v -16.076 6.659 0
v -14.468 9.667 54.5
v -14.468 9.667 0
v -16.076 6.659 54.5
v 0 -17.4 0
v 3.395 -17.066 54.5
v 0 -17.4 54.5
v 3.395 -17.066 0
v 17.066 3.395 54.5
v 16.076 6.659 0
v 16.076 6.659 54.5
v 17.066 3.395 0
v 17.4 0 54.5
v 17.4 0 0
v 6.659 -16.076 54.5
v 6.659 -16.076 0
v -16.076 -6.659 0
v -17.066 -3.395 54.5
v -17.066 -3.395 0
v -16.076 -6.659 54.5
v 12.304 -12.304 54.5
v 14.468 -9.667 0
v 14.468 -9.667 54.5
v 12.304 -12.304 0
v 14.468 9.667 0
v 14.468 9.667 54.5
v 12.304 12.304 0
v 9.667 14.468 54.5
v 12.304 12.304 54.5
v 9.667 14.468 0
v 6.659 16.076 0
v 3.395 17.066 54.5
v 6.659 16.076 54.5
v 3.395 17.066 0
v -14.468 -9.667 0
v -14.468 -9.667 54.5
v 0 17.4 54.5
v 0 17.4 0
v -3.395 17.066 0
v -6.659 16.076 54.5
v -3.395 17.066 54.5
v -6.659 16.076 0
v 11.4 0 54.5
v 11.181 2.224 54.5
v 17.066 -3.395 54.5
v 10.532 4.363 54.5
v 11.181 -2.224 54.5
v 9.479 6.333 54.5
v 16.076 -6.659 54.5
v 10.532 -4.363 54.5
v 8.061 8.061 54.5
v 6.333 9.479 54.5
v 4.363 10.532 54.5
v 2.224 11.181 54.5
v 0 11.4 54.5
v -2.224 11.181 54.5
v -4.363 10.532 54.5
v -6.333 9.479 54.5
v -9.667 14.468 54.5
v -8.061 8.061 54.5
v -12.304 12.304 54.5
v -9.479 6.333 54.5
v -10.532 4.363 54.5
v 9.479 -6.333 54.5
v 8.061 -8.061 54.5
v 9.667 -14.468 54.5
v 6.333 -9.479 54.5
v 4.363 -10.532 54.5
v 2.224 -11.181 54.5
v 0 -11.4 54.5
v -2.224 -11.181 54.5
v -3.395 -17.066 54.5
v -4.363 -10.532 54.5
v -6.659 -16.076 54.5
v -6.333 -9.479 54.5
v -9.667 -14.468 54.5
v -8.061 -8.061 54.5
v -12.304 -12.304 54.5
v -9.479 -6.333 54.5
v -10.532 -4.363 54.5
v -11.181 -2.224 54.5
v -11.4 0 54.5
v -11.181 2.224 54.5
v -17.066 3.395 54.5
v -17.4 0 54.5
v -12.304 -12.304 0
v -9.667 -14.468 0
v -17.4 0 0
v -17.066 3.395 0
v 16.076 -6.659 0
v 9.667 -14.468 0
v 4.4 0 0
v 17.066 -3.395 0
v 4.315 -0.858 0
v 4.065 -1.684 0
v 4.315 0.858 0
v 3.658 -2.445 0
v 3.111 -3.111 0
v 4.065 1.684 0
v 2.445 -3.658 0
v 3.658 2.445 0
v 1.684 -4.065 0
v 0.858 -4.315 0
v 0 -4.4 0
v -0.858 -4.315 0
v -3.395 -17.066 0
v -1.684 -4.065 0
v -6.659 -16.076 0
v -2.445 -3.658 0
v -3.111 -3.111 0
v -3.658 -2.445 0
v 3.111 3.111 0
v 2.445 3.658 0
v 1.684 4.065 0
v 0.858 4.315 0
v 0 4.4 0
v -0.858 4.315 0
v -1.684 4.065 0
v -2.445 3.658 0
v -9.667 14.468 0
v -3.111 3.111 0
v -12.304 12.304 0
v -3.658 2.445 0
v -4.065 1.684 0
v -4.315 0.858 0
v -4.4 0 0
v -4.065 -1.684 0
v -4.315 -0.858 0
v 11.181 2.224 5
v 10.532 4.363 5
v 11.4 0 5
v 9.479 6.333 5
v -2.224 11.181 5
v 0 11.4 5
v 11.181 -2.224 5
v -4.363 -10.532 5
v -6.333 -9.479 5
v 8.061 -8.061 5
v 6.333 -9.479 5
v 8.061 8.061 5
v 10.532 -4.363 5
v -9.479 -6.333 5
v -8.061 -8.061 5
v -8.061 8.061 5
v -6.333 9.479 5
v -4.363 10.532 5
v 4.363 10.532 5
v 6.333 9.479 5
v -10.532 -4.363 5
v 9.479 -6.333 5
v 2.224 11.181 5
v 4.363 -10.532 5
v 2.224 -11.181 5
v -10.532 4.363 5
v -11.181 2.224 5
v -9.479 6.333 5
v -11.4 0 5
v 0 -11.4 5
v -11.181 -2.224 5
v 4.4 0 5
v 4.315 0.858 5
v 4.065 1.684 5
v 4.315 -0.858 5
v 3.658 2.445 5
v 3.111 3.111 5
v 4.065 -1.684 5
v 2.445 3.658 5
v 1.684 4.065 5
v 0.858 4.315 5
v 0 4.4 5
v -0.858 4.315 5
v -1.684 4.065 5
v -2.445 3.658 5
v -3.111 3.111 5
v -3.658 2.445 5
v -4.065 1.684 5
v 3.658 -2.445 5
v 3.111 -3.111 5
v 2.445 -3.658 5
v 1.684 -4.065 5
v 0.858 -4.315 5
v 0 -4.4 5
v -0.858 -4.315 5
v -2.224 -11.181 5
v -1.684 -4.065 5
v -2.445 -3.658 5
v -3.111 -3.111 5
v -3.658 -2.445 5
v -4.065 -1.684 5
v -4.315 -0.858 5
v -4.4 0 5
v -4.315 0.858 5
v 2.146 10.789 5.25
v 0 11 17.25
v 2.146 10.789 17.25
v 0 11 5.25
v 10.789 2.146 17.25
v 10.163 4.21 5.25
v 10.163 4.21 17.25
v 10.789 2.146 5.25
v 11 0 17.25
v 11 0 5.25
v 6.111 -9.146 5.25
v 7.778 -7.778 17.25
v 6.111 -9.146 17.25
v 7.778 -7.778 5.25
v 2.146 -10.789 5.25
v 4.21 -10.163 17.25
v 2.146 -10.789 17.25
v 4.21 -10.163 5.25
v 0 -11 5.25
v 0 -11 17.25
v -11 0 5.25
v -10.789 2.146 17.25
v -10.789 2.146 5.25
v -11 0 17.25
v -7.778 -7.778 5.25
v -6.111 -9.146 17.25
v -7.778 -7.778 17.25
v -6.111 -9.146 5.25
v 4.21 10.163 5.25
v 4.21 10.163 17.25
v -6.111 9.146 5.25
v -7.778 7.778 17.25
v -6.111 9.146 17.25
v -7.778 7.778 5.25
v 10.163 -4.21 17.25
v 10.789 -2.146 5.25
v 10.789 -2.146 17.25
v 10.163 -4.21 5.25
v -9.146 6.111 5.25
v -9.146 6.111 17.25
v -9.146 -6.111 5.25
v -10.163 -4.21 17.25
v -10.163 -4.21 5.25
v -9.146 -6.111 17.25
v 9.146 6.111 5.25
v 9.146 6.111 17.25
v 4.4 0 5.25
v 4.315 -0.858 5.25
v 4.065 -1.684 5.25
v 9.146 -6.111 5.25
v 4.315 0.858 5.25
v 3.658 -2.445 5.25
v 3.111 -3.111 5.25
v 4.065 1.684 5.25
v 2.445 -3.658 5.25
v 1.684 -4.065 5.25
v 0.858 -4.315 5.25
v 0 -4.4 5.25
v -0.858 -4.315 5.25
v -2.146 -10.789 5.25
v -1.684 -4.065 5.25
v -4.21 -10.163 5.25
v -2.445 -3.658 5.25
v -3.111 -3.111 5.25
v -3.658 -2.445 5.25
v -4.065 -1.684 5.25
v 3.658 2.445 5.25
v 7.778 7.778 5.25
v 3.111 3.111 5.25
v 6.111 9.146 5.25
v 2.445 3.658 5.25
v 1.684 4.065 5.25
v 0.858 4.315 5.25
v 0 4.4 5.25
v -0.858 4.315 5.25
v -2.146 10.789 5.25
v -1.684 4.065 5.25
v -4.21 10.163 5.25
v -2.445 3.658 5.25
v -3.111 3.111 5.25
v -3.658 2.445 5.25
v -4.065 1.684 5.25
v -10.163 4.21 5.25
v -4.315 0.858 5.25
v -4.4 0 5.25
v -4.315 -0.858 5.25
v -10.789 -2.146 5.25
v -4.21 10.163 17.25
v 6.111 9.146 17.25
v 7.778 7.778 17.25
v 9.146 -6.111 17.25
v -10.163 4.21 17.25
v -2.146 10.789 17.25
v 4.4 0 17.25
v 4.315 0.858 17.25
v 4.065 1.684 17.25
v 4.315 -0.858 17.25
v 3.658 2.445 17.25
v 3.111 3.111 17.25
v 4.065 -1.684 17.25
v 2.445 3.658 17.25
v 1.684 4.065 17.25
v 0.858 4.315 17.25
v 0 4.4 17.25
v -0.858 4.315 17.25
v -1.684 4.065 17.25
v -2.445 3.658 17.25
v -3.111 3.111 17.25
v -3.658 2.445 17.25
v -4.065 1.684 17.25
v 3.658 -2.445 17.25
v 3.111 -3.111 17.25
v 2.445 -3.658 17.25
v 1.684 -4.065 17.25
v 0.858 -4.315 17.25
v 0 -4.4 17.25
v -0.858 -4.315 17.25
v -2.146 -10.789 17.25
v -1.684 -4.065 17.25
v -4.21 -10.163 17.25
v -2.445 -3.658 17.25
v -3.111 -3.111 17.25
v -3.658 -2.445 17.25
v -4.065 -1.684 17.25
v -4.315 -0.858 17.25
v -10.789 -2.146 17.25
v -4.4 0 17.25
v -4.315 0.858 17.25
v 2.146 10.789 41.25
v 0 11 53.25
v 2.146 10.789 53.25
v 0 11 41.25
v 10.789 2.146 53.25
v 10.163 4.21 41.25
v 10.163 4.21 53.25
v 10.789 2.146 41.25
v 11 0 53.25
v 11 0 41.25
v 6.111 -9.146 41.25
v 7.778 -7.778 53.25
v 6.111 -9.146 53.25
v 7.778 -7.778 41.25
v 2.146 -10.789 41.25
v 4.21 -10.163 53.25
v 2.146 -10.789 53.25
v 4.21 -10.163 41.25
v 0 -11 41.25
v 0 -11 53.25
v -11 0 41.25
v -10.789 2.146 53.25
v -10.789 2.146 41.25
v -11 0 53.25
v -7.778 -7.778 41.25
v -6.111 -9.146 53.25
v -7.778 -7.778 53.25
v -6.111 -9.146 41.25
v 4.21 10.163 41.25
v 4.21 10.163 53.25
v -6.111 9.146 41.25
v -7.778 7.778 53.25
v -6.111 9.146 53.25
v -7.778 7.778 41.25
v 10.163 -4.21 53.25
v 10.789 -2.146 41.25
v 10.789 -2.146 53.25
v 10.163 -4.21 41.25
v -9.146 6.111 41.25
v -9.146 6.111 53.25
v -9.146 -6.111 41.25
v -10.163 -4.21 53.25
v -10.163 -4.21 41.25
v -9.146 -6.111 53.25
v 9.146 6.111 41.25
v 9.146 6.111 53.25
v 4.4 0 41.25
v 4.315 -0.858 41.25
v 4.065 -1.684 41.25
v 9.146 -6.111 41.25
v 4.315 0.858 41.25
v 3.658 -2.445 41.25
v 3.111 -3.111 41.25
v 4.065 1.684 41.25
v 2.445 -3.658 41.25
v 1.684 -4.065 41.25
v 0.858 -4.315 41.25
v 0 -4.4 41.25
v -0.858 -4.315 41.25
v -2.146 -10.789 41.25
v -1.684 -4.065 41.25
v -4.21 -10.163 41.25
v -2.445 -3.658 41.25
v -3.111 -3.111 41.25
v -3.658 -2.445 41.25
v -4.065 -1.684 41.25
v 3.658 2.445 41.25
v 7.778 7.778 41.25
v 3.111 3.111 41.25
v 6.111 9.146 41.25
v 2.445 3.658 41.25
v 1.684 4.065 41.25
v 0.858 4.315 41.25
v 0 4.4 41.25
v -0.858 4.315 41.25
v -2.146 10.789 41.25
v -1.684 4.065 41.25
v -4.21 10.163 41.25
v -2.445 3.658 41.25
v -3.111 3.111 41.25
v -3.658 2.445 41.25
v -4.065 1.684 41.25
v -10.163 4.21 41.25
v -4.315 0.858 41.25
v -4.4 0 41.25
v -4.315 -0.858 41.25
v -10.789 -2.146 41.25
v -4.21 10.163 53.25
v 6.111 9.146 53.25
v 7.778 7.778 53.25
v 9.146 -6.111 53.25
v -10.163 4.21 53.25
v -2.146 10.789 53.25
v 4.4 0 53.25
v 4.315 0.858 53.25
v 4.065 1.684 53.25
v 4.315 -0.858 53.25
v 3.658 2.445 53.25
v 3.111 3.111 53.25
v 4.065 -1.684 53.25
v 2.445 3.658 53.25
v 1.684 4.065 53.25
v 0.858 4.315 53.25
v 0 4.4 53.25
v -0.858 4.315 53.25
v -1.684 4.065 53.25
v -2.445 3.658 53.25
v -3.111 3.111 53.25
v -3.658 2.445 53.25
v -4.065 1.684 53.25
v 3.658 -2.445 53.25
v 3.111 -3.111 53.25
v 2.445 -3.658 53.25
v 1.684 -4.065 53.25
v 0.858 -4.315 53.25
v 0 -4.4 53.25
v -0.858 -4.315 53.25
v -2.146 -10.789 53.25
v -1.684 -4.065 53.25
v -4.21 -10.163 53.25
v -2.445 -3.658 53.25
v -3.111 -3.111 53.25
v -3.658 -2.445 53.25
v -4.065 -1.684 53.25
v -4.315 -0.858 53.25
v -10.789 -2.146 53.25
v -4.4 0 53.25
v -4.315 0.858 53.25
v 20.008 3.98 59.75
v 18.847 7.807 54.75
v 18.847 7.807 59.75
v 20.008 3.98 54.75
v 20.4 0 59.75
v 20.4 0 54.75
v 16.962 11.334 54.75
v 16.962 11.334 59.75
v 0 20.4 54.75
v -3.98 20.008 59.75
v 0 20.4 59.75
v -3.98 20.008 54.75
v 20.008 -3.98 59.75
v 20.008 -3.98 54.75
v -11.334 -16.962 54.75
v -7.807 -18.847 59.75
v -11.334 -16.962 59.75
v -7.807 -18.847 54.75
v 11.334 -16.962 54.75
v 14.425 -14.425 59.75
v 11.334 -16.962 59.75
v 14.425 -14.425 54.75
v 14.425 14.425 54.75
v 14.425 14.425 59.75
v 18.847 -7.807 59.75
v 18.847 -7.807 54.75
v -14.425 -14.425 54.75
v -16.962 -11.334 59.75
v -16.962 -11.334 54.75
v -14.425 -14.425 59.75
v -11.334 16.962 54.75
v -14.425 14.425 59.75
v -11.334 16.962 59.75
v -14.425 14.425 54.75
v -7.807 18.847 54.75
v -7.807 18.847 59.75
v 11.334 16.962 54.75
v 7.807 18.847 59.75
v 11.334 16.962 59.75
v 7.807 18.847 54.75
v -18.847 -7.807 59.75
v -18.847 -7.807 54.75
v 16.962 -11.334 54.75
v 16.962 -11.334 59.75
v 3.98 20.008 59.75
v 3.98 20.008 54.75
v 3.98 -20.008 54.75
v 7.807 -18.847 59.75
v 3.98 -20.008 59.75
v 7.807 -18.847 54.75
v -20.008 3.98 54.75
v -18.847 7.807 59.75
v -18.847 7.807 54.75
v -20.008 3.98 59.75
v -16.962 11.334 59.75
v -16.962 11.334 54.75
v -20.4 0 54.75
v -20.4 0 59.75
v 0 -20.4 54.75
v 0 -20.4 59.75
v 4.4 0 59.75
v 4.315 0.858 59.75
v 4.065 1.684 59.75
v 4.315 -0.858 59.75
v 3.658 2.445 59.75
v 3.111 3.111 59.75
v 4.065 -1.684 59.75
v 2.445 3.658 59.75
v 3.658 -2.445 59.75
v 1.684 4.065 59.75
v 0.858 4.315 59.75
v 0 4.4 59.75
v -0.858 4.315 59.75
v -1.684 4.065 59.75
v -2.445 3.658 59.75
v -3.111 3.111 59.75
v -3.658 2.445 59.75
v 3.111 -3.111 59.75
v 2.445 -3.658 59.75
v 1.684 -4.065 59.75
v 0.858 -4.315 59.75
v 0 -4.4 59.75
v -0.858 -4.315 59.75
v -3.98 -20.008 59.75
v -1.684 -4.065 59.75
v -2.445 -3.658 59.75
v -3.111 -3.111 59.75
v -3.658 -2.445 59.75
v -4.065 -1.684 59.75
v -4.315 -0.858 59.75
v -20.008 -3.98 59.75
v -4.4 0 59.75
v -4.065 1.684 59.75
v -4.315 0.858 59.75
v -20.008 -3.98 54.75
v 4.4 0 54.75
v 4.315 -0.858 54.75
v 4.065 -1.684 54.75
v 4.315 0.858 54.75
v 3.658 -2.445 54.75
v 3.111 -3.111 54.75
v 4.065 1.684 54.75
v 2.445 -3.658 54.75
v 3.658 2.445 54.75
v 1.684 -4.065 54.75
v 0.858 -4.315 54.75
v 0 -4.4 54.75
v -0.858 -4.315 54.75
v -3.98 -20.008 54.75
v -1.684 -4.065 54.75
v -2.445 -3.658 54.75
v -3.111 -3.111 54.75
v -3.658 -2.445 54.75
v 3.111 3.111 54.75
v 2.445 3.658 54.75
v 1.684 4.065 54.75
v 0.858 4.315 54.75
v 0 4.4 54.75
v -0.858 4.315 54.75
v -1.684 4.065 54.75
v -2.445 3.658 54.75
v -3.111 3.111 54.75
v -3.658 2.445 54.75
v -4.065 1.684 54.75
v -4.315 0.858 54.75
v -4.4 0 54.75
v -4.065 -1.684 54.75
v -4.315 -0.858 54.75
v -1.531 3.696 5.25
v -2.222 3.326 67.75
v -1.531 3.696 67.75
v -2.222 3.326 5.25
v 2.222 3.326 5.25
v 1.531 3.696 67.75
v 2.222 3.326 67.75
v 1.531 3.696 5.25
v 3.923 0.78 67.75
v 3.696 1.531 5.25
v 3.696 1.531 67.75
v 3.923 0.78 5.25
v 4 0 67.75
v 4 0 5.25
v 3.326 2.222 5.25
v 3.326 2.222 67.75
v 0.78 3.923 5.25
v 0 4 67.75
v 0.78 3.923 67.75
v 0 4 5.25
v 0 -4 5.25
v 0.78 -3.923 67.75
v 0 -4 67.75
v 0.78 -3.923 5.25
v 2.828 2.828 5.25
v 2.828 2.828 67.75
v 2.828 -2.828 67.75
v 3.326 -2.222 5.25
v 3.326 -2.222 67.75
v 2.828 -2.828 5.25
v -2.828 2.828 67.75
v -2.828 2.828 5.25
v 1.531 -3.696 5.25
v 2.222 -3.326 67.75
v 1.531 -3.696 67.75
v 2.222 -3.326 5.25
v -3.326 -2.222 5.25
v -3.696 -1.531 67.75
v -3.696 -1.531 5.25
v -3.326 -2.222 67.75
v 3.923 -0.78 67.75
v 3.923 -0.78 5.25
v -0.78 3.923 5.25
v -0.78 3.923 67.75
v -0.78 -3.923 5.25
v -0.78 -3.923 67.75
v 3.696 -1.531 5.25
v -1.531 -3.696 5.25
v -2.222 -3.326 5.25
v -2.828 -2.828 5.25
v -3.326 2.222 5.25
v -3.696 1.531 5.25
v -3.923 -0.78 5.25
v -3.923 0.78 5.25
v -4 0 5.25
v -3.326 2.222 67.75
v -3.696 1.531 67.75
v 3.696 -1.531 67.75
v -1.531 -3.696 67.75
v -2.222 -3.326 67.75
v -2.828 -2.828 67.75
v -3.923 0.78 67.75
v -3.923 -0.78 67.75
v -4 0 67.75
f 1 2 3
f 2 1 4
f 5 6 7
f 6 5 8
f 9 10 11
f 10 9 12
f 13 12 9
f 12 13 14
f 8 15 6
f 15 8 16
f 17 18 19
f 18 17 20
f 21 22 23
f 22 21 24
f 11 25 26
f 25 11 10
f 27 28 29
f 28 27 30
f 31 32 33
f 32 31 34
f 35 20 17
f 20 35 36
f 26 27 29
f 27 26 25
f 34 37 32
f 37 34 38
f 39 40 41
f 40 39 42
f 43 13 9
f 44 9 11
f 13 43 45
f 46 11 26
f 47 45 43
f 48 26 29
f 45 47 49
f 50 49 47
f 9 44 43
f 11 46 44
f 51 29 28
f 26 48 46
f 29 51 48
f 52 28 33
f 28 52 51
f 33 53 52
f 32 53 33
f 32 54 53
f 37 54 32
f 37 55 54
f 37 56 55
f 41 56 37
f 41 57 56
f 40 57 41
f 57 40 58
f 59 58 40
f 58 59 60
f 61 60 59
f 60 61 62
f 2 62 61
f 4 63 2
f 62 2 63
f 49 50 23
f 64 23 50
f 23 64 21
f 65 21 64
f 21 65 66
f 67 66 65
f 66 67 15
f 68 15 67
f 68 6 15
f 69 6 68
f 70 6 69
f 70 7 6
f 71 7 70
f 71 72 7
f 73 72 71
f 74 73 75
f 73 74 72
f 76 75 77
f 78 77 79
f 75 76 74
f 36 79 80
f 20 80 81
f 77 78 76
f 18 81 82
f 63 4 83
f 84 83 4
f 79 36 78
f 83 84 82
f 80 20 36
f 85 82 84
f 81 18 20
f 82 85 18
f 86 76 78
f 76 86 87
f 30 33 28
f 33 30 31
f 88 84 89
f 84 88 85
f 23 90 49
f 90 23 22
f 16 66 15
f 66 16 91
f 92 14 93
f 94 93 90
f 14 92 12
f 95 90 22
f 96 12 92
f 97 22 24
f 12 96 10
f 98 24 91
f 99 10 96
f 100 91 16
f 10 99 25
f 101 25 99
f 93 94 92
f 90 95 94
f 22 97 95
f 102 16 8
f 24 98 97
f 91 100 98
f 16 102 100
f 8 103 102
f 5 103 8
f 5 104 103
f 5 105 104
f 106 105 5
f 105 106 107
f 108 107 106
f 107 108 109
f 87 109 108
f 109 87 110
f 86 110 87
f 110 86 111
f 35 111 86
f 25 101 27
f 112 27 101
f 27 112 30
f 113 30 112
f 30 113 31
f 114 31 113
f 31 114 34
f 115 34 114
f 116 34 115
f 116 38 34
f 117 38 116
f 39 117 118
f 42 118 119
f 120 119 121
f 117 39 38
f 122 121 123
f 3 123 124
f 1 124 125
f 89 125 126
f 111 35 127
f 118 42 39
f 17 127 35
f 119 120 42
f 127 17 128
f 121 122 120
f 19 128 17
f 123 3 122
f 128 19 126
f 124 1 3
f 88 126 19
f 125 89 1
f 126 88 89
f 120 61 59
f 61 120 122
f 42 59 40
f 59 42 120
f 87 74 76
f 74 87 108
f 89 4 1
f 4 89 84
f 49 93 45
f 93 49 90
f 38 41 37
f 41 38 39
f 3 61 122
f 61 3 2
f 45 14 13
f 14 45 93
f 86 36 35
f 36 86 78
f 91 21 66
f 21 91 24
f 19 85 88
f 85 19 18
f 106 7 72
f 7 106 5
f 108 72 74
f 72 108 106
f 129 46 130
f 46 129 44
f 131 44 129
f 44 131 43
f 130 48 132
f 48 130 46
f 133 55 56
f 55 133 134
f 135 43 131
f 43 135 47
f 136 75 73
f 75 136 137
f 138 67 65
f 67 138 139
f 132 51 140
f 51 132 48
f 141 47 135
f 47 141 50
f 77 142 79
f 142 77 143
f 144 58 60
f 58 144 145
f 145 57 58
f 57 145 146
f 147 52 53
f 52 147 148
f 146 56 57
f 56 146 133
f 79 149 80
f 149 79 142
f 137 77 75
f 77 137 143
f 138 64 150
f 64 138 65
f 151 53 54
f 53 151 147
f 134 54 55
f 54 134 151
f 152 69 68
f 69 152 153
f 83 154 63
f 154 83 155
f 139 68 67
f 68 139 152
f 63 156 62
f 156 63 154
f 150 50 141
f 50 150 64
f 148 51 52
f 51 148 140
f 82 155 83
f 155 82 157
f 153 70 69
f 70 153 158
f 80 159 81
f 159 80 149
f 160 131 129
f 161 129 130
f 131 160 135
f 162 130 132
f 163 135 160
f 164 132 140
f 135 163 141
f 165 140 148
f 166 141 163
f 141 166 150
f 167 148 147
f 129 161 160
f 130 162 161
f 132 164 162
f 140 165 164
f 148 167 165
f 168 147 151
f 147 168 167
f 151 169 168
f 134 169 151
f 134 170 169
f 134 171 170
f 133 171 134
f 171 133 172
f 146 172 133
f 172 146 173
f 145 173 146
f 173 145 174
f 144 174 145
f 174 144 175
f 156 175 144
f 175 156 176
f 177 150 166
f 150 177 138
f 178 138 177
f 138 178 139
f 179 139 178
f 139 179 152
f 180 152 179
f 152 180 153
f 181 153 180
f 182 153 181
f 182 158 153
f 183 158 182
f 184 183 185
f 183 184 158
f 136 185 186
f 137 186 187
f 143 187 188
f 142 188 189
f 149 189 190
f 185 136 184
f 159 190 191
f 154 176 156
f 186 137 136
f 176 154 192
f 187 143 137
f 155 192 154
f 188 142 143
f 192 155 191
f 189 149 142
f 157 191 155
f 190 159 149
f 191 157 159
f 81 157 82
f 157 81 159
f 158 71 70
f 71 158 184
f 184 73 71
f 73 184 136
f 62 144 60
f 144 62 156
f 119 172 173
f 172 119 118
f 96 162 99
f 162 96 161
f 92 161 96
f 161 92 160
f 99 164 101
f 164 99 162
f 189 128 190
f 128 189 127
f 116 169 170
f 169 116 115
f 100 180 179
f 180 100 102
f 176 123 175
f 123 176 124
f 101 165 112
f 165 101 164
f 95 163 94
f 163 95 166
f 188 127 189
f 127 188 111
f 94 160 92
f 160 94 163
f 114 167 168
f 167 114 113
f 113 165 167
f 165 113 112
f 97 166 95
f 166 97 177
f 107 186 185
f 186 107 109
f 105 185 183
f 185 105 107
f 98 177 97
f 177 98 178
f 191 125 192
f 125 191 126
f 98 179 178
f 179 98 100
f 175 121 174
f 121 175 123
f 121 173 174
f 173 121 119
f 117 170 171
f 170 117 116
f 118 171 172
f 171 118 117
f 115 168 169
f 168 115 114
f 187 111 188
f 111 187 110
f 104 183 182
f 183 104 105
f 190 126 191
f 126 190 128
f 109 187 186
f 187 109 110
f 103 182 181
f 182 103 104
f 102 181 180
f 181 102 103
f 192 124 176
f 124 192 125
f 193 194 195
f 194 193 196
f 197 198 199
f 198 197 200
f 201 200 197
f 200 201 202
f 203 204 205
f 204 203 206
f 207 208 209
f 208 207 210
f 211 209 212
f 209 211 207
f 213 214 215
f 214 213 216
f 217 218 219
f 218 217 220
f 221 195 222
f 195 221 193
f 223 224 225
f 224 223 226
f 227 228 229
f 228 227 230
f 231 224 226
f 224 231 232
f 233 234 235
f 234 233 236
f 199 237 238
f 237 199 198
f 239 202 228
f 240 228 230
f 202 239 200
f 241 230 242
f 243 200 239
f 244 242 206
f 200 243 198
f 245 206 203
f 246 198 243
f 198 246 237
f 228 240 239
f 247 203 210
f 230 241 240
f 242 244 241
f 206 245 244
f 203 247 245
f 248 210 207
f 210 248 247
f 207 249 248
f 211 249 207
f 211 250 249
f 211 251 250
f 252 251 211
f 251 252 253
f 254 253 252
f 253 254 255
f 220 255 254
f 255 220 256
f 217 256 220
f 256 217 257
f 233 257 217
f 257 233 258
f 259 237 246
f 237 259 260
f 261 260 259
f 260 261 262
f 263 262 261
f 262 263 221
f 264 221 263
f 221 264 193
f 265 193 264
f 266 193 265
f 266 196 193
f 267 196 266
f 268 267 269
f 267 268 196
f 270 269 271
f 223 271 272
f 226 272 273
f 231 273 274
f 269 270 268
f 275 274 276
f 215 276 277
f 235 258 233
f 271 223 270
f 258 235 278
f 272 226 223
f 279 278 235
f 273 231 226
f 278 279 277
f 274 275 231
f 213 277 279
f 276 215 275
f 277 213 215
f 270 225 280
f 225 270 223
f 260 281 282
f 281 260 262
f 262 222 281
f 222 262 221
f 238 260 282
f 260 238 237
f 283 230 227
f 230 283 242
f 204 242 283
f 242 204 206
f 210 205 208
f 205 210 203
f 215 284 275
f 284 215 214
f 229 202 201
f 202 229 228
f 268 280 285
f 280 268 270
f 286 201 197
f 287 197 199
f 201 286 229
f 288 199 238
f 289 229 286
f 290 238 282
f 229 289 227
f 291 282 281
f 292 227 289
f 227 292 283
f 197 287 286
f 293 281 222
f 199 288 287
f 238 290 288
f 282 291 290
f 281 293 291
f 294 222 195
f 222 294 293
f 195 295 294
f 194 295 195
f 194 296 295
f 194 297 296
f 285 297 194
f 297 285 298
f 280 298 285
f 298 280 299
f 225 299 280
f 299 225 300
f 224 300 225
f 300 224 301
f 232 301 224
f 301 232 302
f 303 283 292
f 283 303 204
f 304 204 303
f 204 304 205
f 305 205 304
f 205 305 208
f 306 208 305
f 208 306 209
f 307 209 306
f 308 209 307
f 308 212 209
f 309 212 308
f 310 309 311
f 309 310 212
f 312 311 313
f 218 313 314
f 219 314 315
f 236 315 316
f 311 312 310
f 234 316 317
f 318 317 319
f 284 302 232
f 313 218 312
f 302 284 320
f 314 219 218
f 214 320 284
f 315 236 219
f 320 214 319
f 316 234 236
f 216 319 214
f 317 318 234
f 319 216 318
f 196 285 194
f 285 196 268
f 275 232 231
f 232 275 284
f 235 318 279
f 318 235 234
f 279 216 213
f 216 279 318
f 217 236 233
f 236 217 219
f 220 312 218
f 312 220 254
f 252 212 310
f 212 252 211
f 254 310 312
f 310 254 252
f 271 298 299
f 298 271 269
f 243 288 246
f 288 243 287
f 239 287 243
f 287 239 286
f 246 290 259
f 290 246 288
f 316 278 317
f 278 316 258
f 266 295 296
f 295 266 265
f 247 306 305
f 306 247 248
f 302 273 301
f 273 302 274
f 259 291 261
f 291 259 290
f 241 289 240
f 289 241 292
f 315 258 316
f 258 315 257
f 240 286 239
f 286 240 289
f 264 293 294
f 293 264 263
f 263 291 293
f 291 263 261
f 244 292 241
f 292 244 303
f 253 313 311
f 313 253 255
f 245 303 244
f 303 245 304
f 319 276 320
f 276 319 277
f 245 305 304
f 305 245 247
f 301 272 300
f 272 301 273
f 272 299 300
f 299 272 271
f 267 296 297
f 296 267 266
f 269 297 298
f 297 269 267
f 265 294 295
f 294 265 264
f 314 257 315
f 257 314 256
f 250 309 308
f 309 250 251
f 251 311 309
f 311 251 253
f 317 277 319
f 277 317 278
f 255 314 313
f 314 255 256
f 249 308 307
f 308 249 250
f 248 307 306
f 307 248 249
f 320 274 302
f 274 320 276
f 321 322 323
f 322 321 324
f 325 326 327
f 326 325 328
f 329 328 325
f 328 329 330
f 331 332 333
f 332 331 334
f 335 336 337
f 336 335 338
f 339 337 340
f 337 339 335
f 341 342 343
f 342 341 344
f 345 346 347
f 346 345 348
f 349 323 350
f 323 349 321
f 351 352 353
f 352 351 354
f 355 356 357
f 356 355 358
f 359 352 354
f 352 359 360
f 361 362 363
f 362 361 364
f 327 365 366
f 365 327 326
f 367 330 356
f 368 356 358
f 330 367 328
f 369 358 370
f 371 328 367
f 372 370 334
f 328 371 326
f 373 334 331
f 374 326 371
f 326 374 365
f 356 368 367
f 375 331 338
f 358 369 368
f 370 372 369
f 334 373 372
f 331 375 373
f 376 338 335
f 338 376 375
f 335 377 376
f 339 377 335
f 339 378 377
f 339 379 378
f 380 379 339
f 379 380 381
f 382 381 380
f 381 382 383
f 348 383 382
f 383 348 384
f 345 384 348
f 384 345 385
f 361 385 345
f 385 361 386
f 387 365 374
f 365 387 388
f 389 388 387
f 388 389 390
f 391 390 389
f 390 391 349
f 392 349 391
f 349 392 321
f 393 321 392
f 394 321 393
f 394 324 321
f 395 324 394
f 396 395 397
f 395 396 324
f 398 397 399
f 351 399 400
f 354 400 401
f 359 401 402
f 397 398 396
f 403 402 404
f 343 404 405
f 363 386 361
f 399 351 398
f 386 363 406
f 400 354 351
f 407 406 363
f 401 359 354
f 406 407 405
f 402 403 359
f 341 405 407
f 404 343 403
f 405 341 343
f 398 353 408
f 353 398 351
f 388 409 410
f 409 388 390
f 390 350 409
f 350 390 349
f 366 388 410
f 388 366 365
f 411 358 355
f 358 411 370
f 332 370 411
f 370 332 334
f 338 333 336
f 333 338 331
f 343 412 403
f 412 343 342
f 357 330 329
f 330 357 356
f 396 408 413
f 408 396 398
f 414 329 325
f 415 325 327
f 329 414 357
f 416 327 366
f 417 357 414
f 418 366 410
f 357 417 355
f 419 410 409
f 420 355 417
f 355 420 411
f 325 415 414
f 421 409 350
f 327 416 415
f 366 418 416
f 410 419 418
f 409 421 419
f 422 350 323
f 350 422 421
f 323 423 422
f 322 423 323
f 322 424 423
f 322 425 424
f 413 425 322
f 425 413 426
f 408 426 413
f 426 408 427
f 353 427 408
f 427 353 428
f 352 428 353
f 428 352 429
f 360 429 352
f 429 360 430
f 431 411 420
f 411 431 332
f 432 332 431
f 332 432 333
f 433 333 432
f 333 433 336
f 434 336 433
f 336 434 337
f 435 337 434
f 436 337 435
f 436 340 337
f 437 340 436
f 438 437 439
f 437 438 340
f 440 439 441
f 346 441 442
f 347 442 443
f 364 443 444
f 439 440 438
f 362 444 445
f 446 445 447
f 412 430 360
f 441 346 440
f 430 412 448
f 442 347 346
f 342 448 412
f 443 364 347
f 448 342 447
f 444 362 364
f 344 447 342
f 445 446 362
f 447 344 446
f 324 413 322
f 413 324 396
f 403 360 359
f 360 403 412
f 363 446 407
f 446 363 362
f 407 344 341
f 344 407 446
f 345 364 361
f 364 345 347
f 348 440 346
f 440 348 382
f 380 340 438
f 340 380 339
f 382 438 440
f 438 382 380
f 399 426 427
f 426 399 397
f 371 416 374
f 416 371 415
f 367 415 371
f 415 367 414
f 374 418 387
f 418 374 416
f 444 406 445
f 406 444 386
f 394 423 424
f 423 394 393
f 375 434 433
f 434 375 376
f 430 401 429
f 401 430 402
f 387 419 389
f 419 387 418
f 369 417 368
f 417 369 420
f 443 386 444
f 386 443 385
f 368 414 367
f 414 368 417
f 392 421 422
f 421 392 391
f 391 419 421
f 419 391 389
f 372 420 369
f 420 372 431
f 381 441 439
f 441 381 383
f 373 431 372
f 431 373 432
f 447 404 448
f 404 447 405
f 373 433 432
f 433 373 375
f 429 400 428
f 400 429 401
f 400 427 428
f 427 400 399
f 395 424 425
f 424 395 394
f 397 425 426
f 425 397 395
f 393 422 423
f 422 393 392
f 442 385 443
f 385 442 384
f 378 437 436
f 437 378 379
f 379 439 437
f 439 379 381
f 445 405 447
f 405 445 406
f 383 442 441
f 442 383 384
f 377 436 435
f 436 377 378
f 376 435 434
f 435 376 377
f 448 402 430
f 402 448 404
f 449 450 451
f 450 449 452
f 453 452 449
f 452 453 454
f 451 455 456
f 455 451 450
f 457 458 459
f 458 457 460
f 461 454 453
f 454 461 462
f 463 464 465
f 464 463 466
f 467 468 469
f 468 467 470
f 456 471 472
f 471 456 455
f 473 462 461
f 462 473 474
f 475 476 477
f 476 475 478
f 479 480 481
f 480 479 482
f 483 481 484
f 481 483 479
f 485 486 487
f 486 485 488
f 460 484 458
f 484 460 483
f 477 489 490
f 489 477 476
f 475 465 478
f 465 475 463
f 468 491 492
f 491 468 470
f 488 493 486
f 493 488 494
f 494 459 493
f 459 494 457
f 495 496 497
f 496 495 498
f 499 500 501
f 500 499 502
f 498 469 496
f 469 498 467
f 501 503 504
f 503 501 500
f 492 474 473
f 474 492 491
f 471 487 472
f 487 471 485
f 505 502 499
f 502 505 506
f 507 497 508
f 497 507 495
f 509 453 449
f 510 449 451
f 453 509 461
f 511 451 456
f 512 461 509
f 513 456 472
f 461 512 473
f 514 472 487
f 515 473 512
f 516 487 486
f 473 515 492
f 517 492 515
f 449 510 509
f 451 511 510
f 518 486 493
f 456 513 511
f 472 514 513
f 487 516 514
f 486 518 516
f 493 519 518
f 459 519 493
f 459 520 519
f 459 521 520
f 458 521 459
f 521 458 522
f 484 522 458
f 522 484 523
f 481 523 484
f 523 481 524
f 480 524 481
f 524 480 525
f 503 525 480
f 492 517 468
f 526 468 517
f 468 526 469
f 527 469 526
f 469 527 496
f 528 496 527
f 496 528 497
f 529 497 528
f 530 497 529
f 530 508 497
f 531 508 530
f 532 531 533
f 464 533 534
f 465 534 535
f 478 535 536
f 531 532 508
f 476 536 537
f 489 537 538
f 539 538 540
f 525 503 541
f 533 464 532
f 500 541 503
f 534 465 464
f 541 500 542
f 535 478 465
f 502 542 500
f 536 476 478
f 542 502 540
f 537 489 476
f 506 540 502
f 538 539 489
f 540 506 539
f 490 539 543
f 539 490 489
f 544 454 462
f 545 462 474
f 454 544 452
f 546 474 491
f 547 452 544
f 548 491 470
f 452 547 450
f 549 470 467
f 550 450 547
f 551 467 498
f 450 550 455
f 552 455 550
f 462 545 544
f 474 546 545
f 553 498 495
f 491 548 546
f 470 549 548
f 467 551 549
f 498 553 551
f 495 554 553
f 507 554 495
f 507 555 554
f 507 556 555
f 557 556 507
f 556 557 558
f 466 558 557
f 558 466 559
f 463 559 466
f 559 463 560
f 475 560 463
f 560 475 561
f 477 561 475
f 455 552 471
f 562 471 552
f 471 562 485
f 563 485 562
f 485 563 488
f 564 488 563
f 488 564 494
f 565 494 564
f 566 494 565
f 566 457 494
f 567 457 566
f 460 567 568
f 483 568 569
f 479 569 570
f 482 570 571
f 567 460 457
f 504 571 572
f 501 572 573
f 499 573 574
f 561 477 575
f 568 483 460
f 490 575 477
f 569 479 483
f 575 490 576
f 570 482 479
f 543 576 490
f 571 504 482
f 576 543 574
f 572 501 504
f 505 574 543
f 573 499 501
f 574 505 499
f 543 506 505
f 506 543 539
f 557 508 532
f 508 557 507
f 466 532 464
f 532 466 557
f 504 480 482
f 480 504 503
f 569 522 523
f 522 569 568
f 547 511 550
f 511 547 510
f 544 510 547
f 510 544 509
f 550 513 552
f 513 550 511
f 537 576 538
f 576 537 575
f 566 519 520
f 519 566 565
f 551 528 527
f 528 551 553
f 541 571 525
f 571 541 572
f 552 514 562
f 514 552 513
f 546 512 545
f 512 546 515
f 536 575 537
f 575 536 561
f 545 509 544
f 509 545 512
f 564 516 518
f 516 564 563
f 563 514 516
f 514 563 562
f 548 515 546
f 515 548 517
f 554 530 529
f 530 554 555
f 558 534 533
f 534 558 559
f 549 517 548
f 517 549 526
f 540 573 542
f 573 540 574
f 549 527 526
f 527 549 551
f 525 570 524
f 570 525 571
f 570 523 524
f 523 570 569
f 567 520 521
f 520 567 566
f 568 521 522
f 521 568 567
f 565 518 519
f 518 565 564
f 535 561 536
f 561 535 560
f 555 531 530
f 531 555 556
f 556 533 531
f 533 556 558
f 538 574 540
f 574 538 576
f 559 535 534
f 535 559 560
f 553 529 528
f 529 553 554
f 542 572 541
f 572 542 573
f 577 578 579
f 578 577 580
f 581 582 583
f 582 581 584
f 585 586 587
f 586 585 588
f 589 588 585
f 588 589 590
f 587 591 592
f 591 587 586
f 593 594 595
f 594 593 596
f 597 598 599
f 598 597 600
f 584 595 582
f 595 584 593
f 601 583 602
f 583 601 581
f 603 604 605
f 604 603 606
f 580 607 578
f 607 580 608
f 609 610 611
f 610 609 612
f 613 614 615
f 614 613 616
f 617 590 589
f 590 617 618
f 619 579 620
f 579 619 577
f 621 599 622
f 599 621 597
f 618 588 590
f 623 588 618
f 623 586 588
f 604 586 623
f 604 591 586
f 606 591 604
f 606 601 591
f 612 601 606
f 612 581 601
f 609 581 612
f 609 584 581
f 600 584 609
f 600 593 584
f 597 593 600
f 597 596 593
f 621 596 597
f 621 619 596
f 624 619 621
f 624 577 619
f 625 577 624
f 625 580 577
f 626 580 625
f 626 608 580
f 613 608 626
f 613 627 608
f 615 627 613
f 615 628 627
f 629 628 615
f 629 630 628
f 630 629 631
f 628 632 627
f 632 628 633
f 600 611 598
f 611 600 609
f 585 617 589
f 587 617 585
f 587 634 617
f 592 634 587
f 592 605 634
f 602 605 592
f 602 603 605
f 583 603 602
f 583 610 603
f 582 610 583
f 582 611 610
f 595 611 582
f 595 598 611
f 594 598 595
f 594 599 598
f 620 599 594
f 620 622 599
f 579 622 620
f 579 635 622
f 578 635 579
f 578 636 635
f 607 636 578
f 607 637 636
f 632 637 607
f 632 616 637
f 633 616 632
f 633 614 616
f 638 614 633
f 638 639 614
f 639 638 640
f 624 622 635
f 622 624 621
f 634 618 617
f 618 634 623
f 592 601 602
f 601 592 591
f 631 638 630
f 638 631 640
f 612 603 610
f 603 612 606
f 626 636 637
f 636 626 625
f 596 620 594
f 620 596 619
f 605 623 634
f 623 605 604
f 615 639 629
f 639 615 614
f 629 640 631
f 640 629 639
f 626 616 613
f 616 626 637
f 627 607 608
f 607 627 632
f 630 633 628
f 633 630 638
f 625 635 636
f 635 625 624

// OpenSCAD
$fn = 32;

// ------------------------------------------------------------------------
// Shaft station: cup d34.8 x 54.5 mm, shaft d8
// Every part is its own module, assembly() places every instance.
// ------------------------------------------------------------------------

// --- part 1 ---
module housing_cup() {
  difference() {
    cylinder(h = 54.5, d = 34.8);
    translate([0, 0, 5]) cylinder(h = 50.5, d = 22.8);
    translate([0, 0, -1]) cylinder(h = 7, d = 8.8);
  }
}

// --- part 2 ---
module bearing_lower() {
  difference() {
      translate([0, 0, 0]) cylinder(h = 12, d = 22);
      translate([0, 0, -1]) cylinder(h = 14, d = 8.8);
    }
}

// --- part 3 ---
module bearing_upper() {
  difference() {
      translate([0, 0, 0]) cylinder(h = 12, d = 22);
      translate([0, 0, -1]) cylinder(h = 14, d = 8.8);
    }
}

// --- part 4 ---
module station_shaft() {
  translate([0, 0, -31.25]) cylinder(h = 62.5, d = 8);
}

// --- part 5 ---
module station_cover() {
  difference() {
    cylinder(h = 5, d = 40.8);
    translate([0, 0, -1]) cylinder(h = 7, d = 8.8);
  }
}

// --- assembly ---
module assembly() {
  color([0.80, 0.24, 0.20]) translate([0, 0, 0]) rotate([0, 0, 0]) housing_cup();
  color([0.20, 0.45, 0.75]) translate([0, 0, 5.25]) rotate([0, 0, 0]) bearing_lower();
  color([0.25, 0.62, 0.32]) translate([0, 0, 41.25]) rotate([0, 0, 0]) bearing_upper();
  color([0.92, 0.70, 0.18]) translate([0, 0, 36.5]) rotate([0, 0, 0]) station_shaft();
  color([0.58, 0.35, 0.70]) translate([0, 0, 54.75]) rotate([0, 0, 0]) station_cover();
}

assembly();
